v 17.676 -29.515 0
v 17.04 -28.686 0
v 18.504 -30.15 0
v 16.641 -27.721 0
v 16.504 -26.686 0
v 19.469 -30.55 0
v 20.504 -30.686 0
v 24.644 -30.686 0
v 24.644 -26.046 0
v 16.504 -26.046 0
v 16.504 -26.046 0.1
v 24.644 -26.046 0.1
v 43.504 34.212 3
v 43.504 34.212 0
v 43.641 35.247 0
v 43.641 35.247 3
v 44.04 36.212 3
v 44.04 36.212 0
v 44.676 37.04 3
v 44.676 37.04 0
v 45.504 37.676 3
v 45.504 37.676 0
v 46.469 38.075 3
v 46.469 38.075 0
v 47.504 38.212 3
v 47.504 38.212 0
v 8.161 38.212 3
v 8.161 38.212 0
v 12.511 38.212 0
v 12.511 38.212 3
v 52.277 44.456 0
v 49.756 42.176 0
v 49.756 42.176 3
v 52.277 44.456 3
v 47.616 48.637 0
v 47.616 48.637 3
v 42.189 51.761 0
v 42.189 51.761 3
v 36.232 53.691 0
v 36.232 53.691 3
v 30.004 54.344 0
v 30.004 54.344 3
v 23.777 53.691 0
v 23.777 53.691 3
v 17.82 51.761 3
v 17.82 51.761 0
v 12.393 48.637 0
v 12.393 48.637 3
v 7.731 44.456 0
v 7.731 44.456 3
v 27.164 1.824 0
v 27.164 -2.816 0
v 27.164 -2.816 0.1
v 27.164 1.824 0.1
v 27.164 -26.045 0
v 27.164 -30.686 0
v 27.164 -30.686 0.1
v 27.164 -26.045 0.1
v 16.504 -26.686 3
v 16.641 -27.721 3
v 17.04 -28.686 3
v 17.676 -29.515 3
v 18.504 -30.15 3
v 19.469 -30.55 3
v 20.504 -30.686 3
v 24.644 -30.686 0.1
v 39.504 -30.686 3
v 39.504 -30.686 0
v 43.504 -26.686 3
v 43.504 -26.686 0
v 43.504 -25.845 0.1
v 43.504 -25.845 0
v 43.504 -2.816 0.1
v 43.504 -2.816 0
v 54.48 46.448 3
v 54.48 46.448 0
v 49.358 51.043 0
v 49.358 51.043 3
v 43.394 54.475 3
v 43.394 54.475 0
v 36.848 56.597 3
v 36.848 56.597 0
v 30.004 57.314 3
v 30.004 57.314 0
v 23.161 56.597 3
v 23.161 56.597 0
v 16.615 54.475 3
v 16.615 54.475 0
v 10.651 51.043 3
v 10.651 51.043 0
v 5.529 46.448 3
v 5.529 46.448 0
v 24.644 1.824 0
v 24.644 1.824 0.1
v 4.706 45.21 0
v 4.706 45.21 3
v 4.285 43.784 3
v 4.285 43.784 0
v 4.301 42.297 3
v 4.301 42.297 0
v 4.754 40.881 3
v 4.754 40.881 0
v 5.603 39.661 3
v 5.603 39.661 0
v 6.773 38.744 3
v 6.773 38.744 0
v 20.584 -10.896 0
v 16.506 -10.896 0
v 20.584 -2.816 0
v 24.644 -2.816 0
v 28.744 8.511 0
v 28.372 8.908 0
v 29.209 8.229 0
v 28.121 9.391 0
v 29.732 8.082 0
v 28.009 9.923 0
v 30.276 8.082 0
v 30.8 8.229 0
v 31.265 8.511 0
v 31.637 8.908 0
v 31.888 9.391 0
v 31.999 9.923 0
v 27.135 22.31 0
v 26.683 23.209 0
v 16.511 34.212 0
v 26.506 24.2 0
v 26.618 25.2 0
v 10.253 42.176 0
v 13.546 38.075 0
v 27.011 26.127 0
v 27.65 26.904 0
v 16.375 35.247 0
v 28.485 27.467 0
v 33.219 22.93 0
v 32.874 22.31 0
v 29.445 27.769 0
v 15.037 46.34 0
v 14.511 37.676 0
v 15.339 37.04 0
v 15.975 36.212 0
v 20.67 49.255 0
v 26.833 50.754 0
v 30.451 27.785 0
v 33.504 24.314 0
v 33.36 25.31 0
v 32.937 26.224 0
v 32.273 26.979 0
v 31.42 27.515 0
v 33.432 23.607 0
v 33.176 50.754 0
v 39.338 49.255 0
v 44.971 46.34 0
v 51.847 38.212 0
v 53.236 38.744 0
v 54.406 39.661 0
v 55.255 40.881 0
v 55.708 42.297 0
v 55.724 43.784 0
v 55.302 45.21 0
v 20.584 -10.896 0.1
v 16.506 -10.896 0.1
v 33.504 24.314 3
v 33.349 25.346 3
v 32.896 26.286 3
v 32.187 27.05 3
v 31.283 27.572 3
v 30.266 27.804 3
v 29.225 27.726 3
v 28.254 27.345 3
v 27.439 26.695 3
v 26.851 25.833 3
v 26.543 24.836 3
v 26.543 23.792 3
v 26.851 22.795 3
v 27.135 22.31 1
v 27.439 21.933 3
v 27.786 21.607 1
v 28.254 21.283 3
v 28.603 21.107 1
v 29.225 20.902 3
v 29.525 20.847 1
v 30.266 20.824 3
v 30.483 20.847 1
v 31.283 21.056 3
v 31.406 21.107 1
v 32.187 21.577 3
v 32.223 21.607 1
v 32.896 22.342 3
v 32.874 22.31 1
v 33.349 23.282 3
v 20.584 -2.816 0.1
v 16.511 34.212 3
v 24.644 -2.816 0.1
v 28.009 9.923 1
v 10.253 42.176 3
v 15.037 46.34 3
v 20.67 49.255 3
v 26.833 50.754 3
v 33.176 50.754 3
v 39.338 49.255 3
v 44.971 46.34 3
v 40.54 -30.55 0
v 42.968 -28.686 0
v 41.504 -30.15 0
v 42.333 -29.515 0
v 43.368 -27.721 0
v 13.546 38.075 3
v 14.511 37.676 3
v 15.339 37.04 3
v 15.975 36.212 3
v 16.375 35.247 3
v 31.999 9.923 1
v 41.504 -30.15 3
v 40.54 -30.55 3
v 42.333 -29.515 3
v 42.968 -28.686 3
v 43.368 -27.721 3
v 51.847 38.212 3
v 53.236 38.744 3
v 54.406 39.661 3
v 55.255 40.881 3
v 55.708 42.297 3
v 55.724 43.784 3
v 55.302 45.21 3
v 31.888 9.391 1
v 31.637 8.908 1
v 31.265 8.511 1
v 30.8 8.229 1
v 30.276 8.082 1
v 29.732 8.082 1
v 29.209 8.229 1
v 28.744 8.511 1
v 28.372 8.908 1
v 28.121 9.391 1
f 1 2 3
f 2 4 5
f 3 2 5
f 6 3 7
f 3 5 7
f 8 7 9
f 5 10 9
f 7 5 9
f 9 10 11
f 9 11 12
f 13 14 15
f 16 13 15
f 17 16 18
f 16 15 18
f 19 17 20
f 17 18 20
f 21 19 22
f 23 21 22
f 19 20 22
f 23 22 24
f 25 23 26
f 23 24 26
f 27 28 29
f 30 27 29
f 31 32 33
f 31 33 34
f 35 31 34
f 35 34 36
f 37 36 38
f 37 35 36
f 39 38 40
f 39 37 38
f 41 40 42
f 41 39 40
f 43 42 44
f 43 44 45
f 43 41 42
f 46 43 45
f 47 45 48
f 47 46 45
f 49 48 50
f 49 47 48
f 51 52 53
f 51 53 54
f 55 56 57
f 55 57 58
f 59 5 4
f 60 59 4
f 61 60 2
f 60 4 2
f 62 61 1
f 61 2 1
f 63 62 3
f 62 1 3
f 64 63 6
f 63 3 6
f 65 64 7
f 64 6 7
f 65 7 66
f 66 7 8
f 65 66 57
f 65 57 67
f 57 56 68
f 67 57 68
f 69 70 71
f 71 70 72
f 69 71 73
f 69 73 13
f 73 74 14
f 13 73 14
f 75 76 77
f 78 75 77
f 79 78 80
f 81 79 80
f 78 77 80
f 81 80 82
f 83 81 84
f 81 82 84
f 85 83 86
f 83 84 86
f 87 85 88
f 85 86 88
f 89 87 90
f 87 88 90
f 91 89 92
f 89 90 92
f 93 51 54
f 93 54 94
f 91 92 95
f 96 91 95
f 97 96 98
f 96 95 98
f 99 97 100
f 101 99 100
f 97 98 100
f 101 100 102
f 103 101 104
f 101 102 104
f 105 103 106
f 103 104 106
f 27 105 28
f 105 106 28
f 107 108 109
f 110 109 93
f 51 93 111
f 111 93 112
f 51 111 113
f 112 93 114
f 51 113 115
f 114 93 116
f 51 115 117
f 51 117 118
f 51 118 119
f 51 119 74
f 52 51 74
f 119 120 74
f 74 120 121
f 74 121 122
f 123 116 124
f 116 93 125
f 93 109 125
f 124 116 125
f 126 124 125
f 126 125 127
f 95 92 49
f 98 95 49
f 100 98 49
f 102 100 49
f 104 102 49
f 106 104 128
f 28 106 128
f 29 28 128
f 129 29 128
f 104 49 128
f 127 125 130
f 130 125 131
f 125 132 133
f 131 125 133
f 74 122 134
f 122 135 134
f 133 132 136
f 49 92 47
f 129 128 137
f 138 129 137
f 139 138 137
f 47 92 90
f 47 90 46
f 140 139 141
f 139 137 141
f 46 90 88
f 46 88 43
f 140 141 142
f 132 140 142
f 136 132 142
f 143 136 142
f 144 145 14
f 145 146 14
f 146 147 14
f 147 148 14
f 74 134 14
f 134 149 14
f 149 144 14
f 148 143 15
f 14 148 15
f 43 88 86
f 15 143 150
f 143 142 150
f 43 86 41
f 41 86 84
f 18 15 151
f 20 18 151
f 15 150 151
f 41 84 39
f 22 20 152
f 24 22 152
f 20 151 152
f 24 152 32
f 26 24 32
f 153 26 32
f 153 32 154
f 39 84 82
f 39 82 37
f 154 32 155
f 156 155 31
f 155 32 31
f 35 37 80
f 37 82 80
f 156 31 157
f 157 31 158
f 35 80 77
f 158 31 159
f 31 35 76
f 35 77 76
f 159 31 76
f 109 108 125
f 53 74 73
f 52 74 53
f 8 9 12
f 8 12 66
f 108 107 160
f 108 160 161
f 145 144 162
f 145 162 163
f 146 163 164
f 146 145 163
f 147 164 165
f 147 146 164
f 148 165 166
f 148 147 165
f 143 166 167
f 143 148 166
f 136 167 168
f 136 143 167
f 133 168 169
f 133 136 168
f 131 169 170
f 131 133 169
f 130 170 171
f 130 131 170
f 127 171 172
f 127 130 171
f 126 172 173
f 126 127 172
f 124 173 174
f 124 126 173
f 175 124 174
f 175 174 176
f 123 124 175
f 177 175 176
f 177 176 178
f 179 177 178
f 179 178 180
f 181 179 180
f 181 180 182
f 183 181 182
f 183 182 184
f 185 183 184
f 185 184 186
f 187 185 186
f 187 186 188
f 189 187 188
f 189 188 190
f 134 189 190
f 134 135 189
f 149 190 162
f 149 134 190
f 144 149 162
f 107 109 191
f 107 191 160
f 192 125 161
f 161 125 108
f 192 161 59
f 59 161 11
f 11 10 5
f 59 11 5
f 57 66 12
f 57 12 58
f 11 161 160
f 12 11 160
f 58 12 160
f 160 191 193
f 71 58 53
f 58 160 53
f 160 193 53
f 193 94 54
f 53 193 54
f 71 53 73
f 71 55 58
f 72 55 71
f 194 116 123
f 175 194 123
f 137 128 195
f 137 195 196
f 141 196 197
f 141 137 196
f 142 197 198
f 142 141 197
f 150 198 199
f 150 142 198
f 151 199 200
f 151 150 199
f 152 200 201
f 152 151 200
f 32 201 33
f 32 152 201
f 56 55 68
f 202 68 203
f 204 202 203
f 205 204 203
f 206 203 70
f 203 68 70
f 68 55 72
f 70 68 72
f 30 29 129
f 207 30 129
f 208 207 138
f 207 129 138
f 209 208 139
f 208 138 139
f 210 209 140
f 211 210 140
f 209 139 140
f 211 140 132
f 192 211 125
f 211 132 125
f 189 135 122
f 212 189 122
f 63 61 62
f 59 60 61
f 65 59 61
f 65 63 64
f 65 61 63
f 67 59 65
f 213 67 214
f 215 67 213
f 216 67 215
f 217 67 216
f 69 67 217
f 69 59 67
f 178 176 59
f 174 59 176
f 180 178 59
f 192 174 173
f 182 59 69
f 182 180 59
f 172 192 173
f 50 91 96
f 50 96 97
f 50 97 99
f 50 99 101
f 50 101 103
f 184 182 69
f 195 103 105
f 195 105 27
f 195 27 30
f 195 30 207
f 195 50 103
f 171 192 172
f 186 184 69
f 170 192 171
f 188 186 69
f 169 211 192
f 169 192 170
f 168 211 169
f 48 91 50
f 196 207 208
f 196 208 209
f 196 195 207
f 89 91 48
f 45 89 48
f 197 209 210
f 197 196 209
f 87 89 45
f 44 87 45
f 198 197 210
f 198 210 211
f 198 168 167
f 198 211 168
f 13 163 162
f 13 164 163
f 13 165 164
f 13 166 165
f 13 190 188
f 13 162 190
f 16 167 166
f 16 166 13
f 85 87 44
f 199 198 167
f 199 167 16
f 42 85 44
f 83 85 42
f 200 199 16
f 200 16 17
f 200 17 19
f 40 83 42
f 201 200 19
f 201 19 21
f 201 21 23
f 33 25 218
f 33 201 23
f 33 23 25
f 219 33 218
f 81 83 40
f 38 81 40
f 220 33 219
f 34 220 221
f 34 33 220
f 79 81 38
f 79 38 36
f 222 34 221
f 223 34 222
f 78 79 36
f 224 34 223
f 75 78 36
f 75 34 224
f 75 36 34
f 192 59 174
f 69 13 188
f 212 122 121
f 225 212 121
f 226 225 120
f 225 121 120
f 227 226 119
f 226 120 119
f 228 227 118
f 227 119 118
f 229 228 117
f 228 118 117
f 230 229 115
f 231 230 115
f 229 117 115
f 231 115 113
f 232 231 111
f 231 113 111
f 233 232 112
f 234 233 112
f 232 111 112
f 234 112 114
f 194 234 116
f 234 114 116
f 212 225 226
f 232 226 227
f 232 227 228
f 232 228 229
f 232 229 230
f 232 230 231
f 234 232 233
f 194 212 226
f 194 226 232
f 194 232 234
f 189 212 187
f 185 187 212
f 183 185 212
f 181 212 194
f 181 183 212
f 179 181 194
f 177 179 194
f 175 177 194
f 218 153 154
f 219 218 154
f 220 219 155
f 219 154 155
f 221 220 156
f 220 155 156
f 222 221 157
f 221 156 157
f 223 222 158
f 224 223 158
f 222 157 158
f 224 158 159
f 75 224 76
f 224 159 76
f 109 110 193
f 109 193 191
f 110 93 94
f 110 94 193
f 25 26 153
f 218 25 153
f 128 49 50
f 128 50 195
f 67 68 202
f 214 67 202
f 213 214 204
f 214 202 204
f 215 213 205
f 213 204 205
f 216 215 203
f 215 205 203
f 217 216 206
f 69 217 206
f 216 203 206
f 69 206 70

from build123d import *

# Parameters (mm, degrees)
CORTE_EXTERIOR_R        = 3.500002593
SALIENTE_EXTRUIR1_DEPTH = 3
CORTAR_EXTRUIR1_DEPTH   = 1
CORTAR_EXTRUIR2_DEPTH   = 0.1


with BuildPart() as part:
    # Corte exterior → Saliente-Extruir1 (new body)
    with BuildSketch(Plane.XY):
        with BuildLine():
            Line((47.504320945, 38.211786495), (51.847305041, 38.211786495))
            ThreePointArc((51.847305041, 38.211786495), (55.534254627, 41.572373104), (54.480090972, 46.448424641))
            ThreePointArc((54.480090972, 46.448424641), (30.004320476, 57.31391234), (5.528550918, 46.448424641))
            ThreePointArc((5.528550918, 46.448424641), (4.474387263, 41.572373104), (8.161336848, 38.211786495))
            Line((8.161336848, 38.211786495), (12.511035037, 38.211786495))
            ThreePointArc((12.511035037, 38.211786495), (15.339462162, 37.04021362), (16.511035037, 34.211786495))
            Line((16.511035037, 34.211786495), (16.504320945, -26.686088981))
            ThreePointArc((16.504320945, -26.686088981), (17.67589382, -29.514516106), (20.504320945, -30.686088981))
            Line((20.504320945, -30.686088981), (39.504320945, -30.686088981))
            ThreePointArc((39.504320945, -30.686088981), (42.33274807, -29.514516106), (43.504320945, -26.686088981))
            Line((43.504320945, -26.686088981), (43.504320945, 34.211786495))
            ThreePointArc((43.504320945, 34.211786495), (44.67589382, 37.04021362), (47.504320945, 38.211786495))
        make_face()
        with Locations((30.00431952, 24.313911283)):
            Circle(CORTE_EXTERIOR_R, mode=Mode.SUBTRACT)
        with BuildLine():
            ThreePointArc((52.277272453, 44.456319148), (30.004320476, 54.343913397), (7.731367869, 44.456320565))
            Line((7.731367869, 44.456320565), (10.253113799, 42.175794866))
            ThreePointArc((10.253113799, 42.175794866), (30.004320476, 50.943913397), (49.755526523, 42.175793449))
            Line((49.755526523, 42.175793449), (52.277272453, 44.456319148))
        make_face(mode=Mode.SUBTRACT)
    extrude(amount=SALIENTE_EXTRUIR1_DEPTH)

    # Grabado Superficie → Cortar-Extruir1 (cut)
    with BuildSketch(Plane.XY):
        with BuildLine():
            Line((32.873672963, 22.309708905), (31.999357171, 9.92309063))
            ThreePointArc((31.999357171, 9.92309063), (30.004320945, 8.063911283), (28.009284719, 9.92309063))
            Line((28.009284719, 9.92309063), (27.134968927, 22.309708905))
            ThreePointArc((27.134968927, 22.309708905), (30.004320945, 20.813910115), (32.873672963, 22.309708905))
        make_face()
    extrude(amount=CORTAR_EXTRUIR1_DEPTH, mode=Mode.SUBTRACT)

    # grabado linea medio → Cortar-Extruir2 (cut)
    with BuildSketch(Plane.XY):
        Polygon((16.504320945, -26.046088981), (24.644320945, -26.046088981), (24.644320945, -30.686088981), (27.164320945, -30.686088981), (27.164320945, -26.044872481), (43.504320945, -25.844872481), (43.504320945, -2.816088981), (27.164320945, -2.816088981), (27.164320945, 1.823911019), (24.644320945, 1.823911019), (24.644320945, -2.816088981), (20.584320945, -2.816088981), (20.584320945, -10.896088981), (16.504320945, -10.896088981), align=None)
    extrude(amount=CORTAR_EXTRUIR2_DEPTH, mode=Mode.SUBTRACT)


solid = part.part
